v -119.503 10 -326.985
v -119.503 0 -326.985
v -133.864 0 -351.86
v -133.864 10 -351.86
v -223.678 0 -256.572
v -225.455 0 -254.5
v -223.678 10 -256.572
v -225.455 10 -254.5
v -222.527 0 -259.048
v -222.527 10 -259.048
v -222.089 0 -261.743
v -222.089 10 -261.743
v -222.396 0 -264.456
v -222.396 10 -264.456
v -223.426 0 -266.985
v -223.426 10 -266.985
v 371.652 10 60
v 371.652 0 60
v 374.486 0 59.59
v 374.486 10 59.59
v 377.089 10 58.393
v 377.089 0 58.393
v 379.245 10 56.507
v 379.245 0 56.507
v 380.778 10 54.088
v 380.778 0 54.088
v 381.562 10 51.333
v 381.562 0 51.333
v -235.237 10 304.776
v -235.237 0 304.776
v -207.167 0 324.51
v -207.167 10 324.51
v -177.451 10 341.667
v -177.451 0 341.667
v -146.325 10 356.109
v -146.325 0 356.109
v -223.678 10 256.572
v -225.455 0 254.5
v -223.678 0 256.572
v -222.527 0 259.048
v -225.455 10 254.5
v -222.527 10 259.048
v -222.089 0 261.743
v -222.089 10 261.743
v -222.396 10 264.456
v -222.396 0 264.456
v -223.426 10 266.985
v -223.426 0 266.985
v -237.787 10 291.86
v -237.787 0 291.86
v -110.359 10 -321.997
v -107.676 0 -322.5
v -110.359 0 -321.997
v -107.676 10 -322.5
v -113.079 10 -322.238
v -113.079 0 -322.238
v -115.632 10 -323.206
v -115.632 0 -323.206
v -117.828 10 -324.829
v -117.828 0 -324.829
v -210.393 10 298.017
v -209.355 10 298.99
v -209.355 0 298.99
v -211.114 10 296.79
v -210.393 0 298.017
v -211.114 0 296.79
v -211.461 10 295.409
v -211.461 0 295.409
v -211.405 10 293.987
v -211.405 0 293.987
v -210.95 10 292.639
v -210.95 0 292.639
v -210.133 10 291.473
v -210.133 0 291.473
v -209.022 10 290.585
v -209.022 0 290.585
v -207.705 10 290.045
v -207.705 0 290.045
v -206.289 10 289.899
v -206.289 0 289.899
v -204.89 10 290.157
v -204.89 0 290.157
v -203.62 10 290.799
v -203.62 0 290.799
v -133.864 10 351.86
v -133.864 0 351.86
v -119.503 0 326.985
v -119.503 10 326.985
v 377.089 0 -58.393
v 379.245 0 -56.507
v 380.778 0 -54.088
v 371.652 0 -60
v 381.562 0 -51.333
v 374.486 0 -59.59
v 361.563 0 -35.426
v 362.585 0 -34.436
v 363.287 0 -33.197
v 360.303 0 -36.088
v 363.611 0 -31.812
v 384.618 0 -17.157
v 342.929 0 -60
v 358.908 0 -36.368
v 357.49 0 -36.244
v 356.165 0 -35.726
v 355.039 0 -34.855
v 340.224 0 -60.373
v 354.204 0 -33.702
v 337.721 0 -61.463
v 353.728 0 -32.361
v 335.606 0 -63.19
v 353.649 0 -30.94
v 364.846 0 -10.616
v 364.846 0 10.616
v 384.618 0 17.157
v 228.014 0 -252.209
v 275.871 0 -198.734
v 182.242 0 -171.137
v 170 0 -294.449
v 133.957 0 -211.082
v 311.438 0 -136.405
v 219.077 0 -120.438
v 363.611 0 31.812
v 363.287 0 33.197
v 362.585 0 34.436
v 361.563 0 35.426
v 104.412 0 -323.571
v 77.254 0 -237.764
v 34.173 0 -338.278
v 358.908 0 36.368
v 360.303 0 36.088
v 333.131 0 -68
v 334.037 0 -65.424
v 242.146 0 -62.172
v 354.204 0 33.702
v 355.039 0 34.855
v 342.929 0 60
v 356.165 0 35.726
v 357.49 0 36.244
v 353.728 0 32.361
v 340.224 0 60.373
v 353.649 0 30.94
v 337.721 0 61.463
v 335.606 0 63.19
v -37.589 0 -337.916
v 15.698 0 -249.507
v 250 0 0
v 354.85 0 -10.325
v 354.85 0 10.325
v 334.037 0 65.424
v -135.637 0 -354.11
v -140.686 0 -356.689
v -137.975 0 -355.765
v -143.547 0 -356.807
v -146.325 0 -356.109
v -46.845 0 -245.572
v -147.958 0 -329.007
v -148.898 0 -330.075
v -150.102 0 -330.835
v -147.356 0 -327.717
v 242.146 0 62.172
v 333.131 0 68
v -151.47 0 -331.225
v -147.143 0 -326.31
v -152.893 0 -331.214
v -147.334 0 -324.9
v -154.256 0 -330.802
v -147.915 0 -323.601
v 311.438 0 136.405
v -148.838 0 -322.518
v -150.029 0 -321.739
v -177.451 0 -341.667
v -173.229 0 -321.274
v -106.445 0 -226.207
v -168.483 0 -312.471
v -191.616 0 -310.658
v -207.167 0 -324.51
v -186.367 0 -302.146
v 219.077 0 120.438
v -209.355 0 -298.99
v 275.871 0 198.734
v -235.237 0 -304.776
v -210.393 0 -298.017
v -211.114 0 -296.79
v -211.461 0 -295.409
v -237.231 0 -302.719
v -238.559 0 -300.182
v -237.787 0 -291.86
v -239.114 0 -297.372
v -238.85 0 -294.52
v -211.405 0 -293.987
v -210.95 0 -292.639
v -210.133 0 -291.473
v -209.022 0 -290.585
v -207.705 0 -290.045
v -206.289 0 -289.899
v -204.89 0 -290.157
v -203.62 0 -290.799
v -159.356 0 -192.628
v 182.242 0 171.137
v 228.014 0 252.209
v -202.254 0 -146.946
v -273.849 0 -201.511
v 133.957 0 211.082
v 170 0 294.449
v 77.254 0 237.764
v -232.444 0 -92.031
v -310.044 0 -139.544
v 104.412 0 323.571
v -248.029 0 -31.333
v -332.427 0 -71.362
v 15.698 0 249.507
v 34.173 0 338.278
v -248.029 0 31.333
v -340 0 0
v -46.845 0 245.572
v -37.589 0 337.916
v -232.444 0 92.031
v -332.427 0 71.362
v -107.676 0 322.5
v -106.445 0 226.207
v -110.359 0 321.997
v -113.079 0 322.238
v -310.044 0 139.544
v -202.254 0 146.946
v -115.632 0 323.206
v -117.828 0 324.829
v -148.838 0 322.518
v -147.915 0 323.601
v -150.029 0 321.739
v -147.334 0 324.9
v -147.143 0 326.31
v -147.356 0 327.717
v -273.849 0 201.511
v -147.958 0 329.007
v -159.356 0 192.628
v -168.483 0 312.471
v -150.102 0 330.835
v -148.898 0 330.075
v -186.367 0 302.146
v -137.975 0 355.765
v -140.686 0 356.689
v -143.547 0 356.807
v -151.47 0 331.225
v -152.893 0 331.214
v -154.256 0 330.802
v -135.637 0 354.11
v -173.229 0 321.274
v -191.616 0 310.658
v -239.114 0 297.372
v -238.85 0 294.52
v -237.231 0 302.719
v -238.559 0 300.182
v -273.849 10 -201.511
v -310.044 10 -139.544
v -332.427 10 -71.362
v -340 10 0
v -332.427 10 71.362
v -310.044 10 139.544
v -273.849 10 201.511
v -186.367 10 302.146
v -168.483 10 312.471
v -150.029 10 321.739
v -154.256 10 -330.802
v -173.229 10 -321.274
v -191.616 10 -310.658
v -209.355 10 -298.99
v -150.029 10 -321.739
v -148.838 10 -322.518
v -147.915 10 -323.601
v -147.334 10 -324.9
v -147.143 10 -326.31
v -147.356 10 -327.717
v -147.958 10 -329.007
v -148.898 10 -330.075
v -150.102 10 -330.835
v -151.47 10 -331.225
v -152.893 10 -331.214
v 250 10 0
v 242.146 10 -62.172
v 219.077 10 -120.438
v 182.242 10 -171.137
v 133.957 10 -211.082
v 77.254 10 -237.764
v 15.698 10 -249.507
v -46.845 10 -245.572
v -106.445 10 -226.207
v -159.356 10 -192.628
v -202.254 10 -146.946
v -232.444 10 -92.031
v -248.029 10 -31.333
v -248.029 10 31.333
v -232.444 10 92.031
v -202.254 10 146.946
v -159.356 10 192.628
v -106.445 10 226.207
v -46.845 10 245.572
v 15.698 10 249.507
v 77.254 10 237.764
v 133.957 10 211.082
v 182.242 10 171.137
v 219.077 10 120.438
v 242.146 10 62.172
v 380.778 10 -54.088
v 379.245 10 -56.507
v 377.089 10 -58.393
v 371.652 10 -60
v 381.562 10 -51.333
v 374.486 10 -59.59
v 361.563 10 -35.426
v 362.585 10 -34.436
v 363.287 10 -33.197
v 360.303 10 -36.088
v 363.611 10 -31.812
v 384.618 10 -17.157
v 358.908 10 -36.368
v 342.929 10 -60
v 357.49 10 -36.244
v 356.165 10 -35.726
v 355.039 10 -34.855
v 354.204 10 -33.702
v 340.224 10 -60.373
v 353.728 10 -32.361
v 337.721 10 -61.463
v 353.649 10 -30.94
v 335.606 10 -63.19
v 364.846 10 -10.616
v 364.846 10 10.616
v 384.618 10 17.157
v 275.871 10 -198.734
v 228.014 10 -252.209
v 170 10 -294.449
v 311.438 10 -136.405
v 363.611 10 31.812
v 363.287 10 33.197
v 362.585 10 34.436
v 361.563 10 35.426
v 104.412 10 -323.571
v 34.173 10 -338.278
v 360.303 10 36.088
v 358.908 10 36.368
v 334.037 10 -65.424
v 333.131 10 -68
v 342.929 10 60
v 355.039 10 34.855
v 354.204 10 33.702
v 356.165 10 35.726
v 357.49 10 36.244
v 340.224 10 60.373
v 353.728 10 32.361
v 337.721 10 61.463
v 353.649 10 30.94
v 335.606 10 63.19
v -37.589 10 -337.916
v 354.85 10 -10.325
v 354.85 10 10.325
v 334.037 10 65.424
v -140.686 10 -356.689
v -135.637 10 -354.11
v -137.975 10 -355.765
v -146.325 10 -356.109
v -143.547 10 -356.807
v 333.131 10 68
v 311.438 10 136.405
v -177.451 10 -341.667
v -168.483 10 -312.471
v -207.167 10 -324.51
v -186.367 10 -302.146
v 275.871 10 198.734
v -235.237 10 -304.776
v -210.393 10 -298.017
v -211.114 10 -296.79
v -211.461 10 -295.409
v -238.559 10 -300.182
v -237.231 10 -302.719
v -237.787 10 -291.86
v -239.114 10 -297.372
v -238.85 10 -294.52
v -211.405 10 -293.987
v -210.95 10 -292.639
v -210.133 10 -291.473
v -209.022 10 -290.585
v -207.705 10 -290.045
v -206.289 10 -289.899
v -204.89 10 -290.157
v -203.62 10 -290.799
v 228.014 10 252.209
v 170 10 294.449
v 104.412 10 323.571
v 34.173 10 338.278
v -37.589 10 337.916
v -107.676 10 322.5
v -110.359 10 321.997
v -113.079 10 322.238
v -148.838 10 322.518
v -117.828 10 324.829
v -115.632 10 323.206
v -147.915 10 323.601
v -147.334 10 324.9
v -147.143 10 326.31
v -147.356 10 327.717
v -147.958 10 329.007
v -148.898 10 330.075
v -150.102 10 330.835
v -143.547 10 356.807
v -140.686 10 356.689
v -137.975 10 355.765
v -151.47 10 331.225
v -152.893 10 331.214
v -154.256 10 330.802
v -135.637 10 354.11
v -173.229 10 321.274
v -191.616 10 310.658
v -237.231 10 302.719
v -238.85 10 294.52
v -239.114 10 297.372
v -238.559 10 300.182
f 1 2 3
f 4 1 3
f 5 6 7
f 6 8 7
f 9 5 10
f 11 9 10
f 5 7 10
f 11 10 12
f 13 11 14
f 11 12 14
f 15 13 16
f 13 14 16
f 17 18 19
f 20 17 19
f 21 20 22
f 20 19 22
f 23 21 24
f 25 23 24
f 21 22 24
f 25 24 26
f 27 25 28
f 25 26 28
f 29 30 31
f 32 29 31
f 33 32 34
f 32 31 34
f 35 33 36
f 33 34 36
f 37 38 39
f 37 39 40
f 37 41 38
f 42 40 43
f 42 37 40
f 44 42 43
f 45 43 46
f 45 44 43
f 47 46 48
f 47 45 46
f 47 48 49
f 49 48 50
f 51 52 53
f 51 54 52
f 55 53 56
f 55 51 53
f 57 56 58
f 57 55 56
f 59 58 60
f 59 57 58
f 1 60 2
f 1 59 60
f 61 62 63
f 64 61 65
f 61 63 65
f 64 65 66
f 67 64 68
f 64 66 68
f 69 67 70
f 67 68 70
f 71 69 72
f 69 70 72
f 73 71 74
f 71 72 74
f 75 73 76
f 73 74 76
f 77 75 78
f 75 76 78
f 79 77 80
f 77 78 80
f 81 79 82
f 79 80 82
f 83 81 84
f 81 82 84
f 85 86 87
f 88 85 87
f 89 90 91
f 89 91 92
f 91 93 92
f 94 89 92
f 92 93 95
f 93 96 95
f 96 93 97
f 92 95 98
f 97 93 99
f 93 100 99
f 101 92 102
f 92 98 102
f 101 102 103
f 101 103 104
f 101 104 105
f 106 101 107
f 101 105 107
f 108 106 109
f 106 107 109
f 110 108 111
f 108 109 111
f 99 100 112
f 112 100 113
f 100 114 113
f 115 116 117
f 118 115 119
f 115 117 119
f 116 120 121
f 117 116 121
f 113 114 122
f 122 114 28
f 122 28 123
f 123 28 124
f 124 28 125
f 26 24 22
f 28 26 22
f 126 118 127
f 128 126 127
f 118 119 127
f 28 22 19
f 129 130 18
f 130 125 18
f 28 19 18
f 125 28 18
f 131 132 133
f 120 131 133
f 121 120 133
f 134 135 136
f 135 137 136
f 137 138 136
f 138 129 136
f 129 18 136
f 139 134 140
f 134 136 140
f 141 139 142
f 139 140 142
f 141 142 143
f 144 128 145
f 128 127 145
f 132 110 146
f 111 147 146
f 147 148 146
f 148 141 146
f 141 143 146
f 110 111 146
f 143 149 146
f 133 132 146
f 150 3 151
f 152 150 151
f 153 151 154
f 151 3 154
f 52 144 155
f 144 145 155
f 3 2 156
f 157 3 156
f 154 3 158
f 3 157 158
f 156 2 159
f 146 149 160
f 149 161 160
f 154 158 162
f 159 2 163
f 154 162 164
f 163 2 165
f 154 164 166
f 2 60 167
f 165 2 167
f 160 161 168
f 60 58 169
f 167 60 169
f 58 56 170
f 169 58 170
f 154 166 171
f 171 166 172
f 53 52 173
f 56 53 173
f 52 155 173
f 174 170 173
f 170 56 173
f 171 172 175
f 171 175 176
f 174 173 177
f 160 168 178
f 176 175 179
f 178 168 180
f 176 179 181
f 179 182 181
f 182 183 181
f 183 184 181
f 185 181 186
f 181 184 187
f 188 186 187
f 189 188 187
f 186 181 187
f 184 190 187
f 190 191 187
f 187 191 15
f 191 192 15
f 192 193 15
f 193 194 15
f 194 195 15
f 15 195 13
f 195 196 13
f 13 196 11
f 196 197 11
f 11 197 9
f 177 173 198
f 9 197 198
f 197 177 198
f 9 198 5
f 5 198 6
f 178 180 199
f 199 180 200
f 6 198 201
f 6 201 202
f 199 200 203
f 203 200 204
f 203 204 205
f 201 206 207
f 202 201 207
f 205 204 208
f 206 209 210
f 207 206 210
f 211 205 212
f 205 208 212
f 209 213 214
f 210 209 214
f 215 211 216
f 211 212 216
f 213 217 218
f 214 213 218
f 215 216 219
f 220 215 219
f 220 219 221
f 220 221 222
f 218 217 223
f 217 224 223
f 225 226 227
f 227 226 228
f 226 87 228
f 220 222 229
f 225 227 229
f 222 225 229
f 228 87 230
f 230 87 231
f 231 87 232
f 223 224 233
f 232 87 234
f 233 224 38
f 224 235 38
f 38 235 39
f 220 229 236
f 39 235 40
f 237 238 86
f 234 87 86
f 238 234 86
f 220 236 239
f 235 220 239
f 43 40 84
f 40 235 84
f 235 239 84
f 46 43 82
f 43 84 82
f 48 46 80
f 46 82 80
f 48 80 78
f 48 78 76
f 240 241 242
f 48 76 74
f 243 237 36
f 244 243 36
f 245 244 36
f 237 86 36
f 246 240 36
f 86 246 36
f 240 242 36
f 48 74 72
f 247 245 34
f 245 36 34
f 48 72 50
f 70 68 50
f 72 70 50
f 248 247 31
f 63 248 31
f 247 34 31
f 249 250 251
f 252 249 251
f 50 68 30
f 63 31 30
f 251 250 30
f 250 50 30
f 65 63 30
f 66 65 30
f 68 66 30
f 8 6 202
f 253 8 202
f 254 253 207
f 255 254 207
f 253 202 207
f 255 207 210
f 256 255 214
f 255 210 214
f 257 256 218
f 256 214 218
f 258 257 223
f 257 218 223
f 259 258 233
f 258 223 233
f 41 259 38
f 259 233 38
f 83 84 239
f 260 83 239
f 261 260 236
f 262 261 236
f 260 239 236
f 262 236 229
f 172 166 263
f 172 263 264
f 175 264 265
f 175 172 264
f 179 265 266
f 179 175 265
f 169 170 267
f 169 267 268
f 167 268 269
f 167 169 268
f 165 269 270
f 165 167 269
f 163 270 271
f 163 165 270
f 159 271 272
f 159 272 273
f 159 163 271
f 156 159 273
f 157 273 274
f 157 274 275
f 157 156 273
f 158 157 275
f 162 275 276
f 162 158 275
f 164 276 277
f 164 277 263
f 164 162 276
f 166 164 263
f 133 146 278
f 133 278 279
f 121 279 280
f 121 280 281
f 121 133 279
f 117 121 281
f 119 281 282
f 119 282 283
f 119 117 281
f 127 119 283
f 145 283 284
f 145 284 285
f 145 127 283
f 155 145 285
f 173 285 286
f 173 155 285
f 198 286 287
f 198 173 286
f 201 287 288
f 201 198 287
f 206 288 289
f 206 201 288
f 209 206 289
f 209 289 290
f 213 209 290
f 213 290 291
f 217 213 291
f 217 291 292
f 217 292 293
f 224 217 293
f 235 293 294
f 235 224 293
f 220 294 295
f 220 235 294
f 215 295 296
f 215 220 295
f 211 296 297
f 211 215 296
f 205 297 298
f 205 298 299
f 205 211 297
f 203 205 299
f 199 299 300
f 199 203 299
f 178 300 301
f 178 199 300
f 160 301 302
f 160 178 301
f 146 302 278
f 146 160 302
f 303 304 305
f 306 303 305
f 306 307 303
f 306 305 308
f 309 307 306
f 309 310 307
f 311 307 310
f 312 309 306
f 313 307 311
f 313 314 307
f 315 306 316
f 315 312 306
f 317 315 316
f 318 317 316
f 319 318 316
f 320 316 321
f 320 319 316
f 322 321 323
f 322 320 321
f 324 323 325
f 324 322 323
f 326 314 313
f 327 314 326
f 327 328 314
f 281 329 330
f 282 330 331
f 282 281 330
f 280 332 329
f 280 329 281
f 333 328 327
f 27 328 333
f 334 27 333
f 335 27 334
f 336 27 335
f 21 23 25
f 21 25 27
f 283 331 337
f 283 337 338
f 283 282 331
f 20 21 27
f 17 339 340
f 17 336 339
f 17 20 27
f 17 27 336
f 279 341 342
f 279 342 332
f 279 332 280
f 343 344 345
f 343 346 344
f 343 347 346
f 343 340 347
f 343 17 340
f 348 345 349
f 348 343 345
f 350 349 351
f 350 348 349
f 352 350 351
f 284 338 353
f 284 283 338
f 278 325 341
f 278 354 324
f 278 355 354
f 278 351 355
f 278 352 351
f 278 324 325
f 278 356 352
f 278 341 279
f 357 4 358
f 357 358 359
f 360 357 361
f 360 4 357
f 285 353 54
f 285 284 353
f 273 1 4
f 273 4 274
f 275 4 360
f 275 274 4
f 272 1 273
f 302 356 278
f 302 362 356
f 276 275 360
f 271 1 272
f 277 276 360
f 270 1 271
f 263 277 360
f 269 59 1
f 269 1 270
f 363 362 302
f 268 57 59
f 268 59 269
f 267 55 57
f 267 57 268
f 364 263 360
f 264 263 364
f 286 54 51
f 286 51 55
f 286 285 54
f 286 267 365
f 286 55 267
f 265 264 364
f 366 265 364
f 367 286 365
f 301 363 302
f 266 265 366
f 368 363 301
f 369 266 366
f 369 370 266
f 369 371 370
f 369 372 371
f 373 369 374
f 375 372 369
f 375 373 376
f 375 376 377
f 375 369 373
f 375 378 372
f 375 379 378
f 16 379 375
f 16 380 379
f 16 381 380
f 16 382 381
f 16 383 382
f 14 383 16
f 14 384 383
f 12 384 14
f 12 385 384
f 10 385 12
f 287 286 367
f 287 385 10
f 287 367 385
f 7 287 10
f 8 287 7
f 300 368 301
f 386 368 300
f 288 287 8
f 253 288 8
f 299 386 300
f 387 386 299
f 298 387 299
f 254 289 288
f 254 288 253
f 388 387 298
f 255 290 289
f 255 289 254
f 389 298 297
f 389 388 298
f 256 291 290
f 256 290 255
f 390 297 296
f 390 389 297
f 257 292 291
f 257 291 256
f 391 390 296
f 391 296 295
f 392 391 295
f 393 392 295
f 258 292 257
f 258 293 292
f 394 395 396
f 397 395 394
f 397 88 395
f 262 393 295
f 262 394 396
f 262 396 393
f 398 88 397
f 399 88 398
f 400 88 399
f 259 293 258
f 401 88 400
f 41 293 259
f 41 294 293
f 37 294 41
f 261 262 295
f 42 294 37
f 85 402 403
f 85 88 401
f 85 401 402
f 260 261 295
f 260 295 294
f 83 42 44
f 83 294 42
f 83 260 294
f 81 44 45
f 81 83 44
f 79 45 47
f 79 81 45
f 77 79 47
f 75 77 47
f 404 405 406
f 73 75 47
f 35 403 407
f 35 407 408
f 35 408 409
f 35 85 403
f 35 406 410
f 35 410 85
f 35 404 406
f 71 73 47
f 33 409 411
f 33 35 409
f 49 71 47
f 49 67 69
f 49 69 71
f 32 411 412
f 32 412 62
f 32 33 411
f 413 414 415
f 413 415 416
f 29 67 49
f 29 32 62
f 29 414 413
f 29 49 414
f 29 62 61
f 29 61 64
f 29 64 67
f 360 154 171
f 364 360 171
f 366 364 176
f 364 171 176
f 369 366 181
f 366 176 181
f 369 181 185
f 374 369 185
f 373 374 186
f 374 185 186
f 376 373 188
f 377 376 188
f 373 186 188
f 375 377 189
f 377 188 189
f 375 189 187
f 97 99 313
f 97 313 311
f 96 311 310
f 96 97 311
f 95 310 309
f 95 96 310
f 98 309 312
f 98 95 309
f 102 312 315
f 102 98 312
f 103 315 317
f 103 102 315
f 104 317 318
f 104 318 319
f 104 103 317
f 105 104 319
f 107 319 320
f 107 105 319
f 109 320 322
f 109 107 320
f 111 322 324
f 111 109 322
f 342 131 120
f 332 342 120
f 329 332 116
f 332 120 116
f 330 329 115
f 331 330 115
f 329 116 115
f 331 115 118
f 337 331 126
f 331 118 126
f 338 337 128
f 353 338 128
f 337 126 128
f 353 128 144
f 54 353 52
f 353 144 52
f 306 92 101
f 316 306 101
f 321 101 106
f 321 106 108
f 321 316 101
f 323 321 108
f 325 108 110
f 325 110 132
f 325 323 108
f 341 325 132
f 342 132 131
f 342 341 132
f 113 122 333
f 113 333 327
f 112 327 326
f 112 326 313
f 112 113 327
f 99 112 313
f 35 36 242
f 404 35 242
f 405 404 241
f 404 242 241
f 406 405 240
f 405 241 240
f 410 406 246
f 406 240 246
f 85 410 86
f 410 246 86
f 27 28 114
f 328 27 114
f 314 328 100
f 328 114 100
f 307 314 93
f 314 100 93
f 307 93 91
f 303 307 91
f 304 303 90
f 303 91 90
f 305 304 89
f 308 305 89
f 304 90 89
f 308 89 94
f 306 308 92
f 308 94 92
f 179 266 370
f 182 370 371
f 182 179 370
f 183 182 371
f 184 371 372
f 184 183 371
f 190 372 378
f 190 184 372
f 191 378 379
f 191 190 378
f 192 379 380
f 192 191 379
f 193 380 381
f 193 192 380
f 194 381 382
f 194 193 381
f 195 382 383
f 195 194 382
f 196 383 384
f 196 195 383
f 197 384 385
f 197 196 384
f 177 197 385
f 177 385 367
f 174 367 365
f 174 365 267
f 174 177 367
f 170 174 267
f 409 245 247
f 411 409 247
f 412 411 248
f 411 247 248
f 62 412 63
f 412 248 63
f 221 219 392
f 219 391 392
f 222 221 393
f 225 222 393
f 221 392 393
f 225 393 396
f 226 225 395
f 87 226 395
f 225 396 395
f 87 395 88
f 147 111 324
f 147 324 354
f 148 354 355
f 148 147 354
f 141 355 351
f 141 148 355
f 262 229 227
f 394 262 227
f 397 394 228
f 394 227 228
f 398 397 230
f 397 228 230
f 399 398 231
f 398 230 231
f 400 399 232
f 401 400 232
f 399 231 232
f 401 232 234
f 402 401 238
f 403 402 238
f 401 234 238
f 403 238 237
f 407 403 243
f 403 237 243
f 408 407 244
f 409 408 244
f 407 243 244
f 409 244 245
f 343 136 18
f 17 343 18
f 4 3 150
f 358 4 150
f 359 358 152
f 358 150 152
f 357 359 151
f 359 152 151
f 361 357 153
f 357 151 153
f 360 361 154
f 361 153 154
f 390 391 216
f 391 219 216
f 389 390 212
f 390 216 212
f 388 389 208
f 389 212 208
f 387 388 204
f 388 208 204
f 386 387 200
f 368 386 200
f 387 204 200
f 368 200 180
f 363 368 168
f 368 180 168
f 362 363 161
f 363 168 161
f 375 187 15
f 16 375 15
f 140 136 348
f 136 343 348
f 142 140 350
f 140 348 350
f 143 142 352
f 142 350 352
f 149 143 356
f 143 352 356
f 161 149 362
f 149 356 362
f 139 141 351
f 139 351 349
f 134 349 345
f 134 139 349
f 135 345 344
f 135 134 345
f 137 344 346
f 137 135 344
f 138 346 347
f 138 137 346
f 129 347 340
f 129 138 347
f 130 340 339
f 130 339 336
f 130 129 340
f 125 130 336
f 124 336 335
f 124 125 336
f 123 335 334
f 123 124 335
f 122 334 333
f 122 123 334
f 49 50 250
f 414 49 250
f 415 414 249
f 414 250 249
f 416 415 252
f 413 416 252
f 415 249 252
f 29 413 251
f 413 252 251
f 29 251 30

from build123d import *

# Parameters (mm, degrees)
SKETCH1_R           = 340
SKETCH1_R_2         = 250
BOSS_EXTRUDE1_DEPTH = 10
BOSS_EXTRUDE2_DEPTH = 10
FILLET1_R           = 10


with BuildPart() as part:
    # Sketch1 → Boss-Extrude1 (new body)
    with BuildSketch(Plane(origin=(0, 0, 0), x_dir=(1, 0, 0), z_dir=(0, 1, 0))):
        Circle(SKETCH1_R)
        Circle(SKETCH1_R_2, mode=Mode.SUBTRACT)
    extrude(amount=BOSS_EXTRUDE1_DEPTH)

    # Sketch2 → Boss-Extrude2 (add)
    with BuildSketch(Plane.XZ):
        with BuildLine():
            Line((371.651718683, -60), (334.664010614, -60))
            ThreePointArc((334.664010614, -60), (340, 0), (334.664010614, 60))
            Line((334.664010614, 60), (371.651718683, 60))
            ThreePointArc((371.651718683, 60), (378.234524569, 57.527726527), (381.562431181, 51.333333333))
            ThreePointArc((381.562431181, 51.333333333), (385, 0), (381.562431181, -51.333333333))
            ThreePointArc((381.562431181, -51.333333333), (378.234524569, -57.527726527), (371.651718683, -60))
        make_face()
        with BuildLine():
            ThreePointArc((363.611064803, 31.811846103), (365, 0), (363.611064803, -31.811846103))
            ThreePointArc((363.611064803, -31.811846103), (358.194312599, -36.35704088), (353.649117823, -30.940288675))
            ThreePointArc((353.649117823, -30.940288675), (355, 0), (353.649117823, 30.940288675))
            ThreePointArc((353.649117823, 30.940288675), (358.194312599, 36.35704088), (363.611064803, 31.811846103))
        make_face(mode=Mode.SUBTRACT)
        with BuildLine():
            Line((-133.864335114, 351.85982974), (-115.37048108, 319.827534924))
            ThreePointArc((-115.37048108, 319.827534924), (-170, 294.448637287), (-219.293529534, 259.827534924))
            Line((-219.293529534, 259.827534924), (-237.787383569, 291.85982974))
            ThreePointArc((-237.787383569, 291.85982974), (-238.937734879, 298.796843602), (-235.237186318, 304.776091866))
            ThreePointArc((-235.237186318, 304.776091866), (-192.5, 333.419780457), (-146.325244863, 356.109425199))
            ThreePointArc((-146.325244863, 356.109425199), (-139.29678969, 356.324570129), (-133.864335114, 351.85982974))
        make_face()
        with BuildLine():
            ThreePointArc((-209.355399268, 298.990496165), (-210.583277308, 292.026853762), (-203.619634905, 290.798975723))
            ThreePointArc((-203.619634905, 290.798975723), (-177.5, 307.439018343), (-150.029482918, 321.739264398))
            ThreePointArc((-150.029482918, 321.739264398), (-147.611035291, 328.383894642), (-154.255665535, 330.802342268))
            ThreePointArc((-154.255665535, 330.802342268), (-182.5, 316.099272381), (-209.355399268, 298.990496165))
        make_face(mode=Mode.SUBTRACT)
        with BuildLine():
            Line((-237.787383569, -291.85982974), (-219.293529534, -259.827534924))
            ThreePointArc((-219.293529534, -259.827534924), (-170, -294.448637287), (-115.37048108, -319.827534924))
            Line((-115.37048108, -319.827534924), (-133.864335114, -351.85982974))
            ThreePointArc((-133.864335114, -351.85982974), (-139.29678969, -356.324570129), (-146.325244863, -356.109425199))
            ThreePointArc((-146.325244863, -356.109425199), (-192.5, -333.419780457), (-235.237186318, -304.776091866))
            ThreePointArc((-235.237186318, -304.776091866), (-238.937734879, -298.796843602), (-237.787383569, -291.85982974))
        make_face()
        with BuildLine():
            ThreePointArc((-154.255665535, -330.802342268), (-182.5, -316.099272381), (-209.355399268, -298.990496165))
            ThreePointArc((-209.355399268, -298.990496165), (-210.583277308, -292.026853762), (-203.619634905, -290.798975723))
            ThreePointArc((-203.619634905, -290.798975723), (-177.5, -307.439018343), (-150.029482918, -321.739264398))
            ThreePointArc((-150.029482918, -321.739264398), (-147.611035291, -328.383894642), (-154.255665535, -330.802342268))
        make_face(mode=Mode.SUBTRACT)
    extrude(amount=-BOSS_EXTRUDE2_DEPTH)

    # Fillet1
    fillet1_edges = [part.edges().sort_by_distance(p)[0] for p in [
        (334.664010614, 5, -60),
        (334.664010614, 5, 60),
        (-115.37048108, 5, 319.827534924),
        (-219.293529534, 5, 259.827534924),
        (-219.293529534, 5, -259.827534924),
        (-115.37048108, 5, -319.827534924),
    ]]
    fillet(fillet1_edges, radius=FILLET1_R)


solid = part.part
